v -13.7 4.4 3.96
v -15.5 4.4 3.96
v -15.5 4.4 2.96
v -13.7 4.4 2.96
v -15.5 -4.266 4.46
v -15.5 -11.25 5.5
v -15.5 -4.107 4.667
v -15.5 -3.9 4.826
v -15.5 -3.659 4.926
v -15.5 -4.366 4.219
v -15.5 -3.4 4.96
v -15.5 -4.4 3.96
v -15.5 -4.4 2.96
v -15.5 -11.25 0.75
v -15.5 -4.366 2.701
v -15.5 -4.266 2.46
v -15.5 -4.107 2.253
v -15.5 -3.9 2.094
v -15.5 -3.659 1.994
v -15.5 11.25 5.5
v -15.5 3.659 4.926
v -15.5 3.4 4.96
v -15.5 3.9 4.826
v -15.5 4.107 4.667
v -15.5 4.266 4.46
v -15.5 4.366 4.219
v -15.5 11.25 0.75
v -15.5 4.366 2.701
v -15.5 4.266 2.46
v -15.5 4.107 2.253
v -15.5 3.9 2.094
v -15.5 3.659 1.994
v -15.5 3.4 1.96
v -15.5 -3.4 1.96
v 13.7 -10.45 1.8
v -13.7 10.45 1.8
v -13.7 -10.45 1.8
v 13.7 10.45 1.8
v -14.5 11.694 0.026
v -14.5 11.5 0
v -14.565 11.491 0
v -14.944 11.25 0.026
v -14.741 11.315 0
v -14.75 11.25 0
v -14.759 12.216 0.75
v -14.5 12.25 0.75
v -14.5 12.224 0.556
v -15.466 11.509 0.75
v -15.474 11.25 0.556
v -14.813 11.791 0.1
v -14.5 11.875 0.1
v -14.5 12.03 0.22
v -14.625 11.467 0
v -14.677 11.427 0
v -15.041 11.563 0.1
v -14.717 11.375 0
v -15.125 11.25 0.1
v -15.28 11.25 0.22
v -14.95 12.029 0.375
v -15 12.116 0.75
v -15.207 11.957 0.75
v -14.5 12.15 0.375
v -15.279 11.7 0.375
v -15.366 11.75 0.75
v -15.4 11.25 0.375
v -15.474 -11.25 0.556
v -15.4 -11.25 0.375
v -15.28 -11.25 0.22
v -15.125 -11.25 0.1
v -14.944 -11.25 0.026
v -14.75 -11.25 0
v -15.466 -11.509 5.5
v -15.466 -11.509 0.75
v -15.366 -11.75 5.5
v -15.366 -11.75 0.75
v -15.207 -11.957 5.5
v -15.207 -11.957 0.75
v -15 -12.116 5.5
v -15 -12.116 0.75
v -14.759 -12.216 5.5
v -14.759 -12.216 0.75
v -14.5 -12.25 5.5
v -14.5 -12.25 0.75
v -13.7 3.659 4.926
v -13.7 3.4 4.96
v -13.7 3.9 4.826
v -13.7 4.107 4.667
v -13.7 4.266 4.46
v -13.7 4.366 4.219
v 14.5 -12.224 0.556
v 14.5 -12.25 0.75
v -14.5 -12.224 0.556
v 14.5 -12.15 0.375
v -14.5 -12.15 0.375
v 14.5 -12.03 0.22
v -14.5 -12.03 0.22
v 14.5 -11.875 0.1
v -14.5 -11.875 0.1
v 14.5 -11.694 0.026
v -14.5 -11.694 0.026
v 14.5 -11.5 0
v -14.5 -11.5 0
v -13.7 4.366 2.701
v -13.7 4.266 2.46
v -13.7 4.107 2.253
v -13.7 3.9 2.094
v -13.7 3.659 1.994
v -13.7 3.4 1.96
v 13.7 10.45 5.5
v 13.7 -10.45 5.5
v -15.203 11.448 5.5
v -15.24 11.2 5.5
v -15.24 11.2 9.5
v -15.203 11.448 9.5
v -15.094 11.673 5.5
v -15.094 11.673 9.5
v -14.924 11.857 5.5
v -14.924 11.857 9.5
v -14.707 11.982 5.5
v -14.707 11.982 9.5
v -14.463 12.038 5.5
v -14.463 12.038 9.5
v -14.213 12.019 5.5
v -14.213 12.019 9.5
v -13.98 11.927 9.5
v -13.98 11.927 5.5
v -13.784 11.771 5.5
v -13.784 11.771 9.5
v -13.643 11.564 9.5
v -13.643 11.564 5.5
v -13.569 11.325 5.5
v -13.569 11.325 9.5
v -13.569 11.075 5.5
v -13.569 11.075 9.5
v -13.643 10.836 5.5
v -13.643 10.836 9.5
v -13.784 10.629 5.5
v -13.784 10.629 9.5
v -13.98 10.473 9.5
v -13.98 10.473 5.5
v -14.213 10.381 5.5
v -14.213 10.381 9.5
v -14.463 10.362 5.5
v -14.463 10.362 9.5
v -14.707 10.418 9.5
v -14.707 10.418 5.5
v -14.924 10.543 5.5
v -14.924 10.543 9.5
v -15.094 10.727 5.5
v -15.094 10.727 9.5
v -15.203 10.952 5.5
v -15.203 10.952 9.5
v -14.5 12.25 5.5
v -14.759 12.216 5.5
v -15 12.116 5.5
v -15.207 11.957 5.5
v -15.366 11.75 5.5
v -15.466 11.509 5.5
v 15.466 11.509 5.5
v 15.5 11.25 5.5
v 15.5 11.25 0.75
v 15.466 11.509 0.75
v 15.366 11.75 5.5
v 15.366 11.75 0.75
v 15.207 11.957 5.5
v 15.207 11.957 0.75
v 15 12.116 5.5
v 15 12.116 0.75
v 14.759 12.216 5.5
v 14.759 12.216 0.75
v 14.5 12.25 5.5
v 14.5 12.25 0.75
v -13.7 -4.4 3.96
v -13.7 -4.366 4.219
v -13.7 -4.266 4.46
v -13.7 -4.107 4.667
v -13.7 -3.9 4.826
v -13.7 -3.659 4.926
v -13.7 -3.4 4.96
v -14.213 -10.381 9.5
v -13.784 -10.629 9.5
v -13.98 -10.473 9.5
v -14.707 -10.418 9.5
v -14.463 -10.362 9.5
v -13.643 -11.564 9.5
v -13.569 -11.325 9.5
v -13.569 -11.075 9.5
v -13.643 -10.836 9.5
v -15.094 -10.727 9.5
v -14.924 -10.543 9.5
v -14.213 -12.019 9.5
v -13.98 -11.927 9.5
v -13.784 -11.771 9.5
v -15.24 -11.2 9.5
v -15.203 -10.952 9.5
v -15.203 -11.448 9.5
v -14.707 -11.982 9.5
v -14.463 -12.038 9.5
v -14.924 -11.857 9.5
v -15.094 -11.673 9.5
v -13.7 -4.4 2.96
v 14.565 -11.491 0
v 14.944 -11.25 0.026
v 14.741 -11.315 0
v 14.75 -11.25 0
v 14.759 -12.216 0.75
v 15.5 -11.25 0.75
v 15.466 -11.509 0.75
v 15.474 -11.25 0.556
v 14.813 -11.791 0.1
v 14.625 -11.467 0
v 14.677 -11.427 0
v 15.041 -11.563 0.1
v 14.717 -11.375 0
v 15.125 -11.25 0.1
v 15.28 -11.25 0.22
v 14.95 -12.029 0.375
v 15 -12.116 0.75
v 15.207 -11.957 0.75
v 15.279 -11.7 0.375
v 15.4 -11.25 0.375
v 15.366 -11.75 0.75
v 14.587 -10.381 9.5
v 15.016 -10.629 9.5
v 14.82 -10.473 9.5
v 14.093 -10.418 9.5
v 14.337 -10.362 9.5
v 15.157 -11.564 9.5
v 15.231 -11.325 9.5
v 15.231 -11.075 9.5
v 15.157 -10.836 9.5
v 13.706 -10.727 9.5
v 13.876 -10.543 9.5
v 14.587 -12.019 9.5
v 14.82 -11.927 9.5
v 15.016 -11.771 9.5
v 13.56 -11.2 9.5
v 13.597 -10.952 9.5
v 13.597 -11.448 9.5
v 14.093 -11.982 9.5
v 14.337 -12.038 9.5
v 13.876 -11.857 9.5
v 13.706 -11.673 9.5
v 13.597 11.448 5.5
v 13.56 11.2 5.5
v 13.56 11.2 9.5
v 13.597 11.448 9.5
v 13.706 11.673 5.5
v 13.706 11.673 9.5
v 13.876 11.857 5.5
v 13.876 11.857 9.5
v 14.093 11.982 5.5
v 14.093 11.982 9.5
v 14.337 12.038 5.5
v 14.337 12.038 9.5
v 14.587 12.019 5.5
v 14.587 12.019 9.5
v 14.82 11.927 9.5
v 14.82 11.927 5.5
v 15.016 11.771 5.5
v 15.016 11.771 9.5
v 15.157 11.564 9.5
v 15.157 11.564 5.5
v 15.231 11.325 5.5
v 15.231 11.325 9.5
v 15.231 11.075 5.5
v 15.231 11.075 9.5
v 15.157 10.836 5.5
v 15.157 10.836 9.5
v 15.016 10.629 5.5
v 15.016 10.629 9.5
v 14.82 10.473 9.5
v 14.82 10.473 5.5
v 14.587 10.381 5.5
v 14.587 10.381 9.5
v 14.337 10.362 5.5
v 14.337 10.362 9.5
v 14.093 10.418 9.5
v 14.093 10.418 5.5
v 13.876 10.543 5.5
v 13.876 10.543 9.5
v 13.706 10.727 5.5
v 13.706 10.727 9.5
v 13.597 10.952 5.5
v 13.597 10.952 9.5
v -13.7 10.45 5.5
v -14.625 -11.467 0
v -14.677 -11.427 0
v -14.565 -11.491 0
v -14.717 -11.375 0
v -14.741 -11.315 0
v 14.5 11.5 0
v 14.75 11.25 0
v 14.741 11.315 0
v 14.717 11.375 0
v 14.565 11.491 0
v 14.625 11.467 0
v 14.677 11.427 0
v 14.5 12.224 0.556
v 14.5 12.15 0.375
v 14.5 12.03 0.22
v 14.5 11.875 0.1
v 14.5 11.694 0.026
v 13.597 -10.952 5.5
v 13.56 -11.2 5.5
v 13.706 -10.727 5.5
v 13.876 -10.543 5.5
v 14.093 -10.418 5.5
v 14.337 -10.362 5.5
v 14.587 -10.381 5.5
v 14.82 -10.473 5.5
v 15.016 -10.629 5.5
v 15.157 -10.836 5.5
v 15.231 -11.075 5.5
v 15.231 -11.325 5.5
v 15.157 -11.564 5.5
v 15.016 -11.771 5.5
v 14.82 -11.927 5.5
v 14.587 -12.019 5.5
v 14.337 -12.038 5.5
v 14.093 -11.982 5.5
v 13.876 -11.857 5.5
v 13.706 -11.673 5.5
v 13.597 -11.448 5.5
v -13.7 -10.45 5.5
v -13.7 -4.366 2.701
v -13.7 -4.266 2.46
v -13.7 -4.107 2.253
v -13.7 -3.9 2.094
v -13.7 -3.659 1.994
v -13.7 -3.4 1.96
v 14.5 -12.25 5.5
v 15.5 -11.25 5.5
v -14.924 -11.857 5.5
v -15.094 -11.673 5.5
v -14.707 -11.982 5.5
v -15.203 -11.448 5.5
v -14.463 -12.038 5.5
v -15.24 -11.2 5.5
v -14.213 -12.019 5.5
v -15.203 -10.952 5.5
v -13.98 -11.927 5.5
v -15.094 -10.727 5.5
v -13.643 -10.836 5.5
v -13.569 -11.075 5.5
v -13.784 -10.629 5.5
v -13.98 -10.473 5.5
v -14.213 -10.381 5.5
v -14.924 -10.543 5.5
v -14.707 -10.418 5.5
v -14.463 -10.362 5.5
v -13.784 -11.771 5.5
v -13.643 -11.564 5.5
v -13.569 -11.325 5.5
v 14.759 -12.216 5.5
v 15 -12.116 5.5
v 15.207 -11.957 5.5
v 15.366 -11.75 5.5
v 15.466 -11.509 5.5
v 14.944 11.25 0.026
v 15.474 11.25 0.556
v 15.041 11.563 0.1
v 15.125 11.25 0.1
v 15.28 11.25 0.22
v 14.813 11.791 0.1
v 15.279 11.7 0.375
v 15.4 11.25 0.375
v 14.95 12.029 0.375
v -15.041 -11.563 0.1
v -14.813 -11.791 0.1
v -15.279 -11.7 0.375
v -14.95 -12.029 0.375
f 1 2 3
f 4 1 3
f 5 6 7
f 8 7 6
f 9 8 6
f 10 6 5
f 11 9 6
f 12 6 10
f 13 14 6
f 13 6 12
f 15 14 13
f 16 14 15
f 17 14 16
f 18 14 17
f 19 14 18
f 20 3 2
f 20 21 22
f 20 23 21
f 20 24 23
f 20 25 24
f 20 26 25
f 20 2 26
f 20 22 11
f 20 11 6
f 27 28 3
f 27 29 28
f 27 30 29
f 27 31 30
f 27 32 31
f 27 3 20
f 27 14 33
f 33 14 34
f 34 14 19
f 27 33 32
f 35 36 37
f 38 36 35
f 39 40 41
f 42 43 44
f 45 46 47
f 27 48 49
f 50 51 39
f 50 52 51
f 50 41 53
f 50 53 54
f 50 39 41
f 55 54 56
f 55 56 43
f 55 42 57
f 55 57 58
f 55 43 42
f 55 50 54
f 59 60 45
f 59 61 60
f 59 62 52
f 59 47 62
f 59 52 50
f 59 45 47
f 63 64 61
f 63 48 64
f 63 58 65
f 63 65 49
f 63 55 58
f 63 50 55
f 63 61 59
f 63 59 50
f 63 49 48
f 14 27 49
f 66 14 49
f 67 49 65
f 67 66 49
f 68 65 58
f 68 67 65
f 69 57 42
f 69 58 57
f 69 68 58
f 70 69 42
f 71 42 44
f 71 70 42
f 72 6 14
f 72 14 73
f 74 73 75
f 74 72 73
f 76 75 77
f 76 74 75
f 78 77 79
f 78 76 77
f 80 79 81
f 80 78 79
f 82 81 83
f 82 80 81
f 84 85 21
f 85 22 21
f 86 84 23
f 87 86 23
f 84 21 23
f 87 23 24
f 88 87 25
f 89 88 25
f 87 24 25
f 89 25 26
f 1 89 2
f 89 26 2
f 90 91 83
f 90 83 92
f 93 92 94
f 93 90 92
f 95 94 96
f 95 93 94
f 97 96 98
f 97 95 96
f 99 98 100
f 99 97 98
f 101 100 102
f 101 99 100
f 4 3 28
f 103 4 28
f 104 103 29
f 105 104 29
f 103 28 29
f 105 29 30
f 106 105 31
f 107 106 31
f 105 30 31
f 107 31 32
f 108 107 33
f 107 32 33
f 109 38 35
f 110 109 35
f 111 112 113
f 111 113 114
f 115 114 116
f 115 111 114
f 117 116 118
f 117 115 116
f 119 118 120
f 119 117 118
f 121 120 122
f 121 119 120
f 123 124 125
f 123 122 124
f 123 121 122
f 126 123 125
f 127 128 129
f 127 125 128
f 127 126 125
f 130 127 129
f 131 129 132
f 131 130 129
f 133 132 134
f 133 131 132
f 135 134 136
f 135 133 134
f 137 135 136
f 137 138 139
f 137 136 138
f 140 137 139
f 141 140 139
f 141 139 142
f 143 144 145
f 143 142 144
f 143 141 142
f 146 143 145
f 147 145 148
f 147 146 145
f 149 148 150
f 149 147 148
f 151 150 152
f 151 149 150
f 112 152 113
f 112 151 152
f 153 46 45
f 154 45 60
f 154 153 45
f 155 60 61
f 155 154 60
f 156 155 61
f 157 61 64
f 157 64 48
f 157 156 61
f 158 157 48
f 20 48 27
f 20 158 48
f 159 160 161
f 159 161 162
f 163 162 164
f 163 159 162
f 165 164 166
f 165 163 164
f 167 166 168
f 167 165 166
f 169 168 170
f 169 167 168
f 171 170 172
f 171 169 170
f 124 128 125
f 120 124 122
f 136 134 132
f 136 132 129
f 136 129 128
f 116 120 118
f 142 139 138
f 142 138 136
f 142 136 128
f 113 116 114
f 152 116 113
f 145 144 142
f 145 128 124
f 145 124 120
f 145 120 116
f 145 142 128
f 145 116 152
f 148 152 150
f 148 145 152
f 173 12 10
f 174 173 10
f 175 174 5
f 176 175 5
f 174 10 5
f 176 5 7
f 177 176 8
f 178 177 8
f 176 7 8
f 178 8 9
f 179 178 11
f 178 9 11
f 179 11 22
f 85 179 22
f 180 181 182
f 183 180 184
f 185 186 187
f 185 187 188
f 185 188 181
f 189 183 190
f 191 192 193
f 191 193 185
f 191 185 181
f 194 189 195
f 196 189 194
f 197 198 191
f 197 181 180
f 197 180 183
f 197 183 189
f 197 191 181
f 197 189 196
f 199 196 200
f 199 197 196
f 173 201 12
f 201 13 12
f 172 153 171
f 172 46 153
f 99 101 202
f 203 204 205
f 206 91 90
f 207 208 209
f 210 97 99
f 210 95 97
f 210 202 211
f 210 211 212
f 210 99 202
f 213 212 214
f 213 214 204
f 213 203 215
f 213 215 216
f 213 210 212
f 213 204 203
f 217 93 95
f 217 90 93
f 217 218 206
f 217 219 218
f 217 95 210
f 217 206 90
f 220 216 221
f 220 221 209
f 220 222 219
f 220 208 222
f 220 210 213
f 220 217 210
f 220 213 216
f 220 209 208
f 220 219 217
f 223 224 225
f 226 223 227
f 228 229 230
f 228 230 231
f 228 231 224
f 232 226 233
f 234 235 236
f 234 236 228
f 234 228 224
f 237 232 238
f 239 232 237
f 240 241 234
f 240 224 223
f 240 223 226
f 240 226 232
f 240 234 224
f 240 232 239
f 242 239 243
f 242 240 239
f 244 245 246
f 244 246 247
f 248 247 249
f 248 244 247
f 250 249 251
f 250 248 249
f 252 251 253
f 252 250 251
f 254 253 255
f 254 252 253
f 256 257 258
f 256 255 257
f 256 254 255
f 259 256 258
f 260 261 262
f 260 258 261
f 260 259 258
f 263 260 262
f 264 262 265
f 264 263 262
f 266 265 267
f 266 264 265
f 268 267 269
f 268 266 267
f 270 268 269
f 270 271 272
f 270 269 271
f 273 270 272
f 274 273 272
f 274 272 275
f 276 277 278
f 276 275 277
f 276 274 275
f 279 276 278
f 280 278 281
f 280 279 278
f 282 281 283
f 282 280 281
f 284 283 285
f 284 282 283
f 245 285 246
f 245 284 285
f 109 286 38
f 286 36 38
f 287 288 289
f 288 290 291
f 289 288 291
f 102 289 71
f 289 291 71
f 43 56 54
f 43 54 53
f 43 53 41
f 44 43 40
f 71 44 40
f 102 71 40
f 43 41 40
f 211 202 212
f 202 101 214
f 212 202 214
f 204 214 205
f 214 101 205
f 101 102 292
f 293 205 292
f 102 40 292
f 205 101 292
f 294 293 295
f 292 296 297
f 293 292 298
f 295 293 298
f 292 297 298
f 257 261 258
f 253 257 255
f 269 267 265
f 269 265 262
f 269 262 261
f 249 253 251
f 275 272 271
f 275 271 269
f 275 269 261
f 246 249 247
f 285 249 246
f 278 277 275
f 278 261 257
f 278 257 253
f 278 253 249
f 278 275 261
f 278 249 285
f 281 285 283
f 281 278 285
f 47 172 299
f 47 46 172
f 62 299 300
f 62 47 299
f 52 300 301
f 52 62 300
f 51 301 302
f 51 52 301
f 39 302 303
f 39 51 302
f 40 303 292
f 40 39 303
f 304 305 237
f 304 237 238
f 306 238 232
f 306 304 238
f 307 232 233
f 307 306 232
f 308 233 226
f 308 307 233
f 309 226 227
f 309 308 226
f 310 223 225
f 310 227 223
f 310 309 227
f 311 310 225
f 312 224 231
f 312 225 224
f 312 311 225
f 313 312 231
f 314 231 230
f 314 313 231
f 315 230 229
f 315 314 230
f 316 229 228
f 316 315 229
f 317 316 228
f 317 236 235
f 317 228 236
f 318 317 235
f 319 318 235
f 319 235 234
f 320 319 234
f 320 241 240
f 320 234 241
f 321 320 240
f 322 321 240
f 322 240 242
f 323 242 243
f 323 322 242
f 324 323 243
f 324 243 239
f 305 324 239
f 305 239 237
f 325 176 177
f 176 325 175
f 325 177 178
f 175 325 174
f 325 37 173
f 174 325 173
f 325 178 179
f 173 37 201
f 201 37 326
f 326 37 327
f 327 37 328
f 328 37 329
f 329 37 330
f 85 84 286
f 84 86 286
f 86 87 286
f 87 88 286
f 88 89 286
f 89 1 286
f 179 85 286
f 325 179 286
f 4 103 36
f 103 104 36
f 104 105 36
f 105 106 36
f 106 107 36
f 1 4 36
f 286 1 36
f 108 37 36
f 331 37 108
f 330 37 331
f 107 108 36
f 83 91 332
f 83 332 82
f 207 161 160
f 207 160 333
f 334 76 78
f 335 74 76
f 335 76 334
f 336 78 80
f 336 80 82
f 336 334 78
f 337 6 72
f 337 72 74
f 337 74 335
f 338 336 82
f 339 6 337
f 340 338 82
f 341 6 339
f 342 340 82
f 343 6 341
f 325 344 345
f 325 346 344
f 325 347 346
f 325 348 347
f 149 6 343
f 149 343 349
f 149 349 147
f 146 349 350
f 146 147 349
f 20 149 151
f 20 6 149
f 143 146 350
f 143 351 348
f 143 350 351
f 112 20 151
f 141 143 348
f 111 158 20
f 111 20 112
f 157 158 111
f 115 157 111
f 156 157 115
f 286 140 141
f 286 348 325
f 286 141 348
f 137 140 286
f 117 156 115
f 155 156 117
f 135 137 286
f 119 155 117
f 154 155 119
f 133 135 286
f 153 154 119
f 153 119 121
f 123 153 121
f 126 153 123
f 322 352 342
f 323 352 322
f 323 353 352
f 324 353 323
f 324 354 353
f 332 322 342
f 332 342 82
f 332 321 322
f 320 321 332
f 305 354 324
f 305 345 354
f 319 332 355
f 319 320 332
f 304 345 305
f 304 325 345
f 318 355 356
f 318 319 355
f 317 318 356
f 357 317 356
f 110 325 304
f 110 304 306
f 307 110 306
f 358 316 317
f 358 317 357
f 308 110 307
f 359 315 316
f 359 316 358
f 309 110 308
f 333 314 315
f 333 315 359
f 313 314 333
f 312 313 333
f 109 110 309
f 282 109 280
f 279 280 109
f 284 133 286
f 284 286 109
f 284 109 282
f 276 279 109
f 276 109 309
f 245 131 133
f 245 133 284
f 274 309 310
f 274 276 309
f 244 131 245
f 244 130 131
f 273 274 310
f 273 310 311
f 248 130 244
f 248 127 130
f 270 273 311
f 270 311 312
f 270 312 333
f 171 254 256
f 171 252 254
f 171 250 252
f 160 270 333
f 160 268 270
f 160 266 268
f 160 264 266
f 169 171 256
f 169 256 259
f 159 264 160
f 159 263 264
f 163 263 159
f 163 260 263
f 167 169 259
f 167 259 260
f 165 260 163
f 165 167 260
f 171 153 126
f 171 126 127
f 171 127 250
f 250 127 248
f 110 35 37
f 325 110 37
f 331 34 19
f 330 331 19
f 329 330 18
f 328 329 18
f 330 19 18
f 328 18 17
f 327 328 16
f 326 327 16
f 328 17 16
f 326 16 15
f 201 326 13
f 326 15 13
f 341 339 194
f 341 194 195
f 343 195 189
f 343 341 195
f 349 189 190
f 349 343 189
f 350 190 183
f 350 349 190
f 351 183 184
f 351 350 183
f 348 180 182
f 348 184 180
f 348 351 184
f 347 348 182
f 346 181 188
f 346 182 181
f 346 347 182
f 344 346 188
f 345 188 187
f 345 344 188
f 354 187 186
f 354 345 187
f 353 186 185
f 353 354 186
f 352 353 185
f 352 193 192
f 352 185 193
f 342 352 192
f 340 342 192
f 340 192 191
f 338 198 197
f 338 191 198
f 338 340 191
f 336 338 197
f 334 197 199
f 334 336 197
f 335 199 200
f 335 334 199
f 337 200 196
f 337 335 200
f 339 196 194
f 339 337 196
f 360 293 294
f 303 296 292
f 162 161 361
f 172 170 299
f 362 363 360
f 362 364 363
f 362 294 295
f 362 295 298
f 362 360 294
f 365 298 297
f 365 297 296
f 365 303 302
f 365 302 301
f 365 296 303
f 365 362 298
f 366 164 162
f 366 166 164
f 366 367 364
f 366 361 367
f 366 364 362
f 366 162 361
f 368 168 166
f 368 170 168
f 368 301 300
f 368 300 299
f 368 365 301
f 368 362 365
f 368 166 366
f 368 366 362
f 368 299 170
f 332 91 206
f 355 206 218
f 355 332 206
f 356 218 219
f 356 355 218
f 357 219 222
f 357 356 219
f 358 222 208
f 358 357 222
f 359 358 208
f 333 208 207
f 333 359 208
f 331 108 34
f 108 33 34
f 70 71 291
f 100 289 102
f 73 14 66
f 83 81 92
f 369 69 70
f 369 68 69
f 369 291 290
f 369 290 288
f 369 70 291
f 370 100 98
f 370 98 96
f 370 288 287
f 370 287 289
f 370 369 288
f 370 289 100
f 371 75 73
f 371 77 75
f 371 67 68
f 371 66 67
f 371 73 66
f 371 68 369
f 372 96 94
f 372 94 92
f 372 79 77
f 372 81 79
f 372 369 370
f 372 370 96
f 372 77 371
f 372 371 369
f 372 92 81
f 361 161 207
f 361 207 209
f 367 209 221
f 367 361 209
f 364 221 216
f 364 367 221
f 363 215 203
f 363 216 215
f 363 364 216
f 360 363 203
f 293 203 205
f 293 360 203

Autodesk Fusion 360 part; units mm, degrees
sketch "Sketch1" plane through (0, 0, 0) normal (0, 0, 1) x (1, 0, 0)
  line L0 (-15.5, 12.25) -> (15.5, 12.25)
  line L1 (15.5, 12.25) -> (15.5, -12.25)
  line L2 (15.5, -12.25) -> (-15.5, -12.25)
  line L3 (-15.5, -12.25) -> (-15.5, 12.25)
  line L4 (-15.5, 12.25) -> (15.5, -12.25) construction
  line L5 (15.5, 12.25) -> (-15.5, -12.25) construction
  dimension "d1" = 31
  dimension "d2" = 24.5
extrude "Extrude1" add sketch "Sketch1" along normal blind 5.5
shell "Shell1" thickness 1.8 removed faces 1 at (-5.1667, 4.0833, 5.5)
sketch "Sketch2" plane through (0, 0, 5.5) normal (0, 0, 1) x (-1, 0, 0)
  line L0 (13.7, 10.45) -> (13.7, -10.45)
  line L1 (13.7, -10.45) -> (-13.7, -10.45)
  line L2 (-13.7, -10.45) -> (-13.7, 10.45)
  line L3 (-13.7, 10.45) -> (13.7, 10.45)
  line L4 (15.5, 12.25) -> (-15.5, 12.25)
  line L5 (-15.5, 12.25) -> (-15.5, -12.25)
  line L6 (-15.5, -12.25) -> (15.5, -12.25)
  line L7 (15.5, -12.25) -> (15.5, 12.25)
  circle A0 centre (14.4, -11.2) radius 0.84
  line L8 (0, 0) -> (0, -2)
  line L9 (0, 0) -> (4, 0)
  circle A1 centre (-14.4, -11.2) radius 0.84
  circle A2 centre (-14.4, 11.2) radius 0.84
  circle A3 centre (14.4, 11.2) radius 0.84
  dimension "d6" = 1.68
  dimension "d7" = 11.2
  dimension "d8" = 14.4
extrude "Extrude2" add sketch "Sketch2" along normal blind 4 contours A0 | A1 | A2 | A3
fillet "Fillet1" radius 1 1 edges at (15.5, -12.25, 2.75)
fillet "Fillet1" radius 1 1 edges at (15.5, 12.25, 2.75)
fillet "Fillet1" radius 1 1 edges at (-15.5, 12.25, 2.75)
fillet "Fillet1" radius 1 1 edges at (-15.5, -12.25, 2.75)
sketch "Sketch3" plane through (-15.5, 0, 0) normal (-1, 0, 0) x (0, -1, 0)
  line L0 (11.25, 0) -> (11.25, 5.5)
  line L1 (11.25, 5.5) -> (-11.25, 5.5)
  line L2 (-11.25, 5.5) -> (-11.25, 0)
  line L3 (-11.25, 0) -> (11.25, 0)
  line L4 (0, 0) -> (0, 1.96)
  line L5 (0, 1.96) -> (0, 3.46)
  line L6 (-3.4, 1.96) -> (3.4, 1.96)
  line L7 (4.4, 2.96) -> (4.4, 3.96)
  line L8 (3.4, 4.96) -> (-3.4, 4.96)
  line L9 (-4.4, 3.96) -> (-4.4, 2.96)
  line L10 (-4.4, 1.96) -> (4.4, 4.96) construction
  line L11 (4.4, 1.96) -> (-4.4, 4.96) construction
  arc A0 (-3.4, 4.96) -> (-4.4, 3.96) centre (-3.4, 3.96) ccw
  arc A1 (-4.4, 2.96) -> (-3.4, 1.96) centre (-3.4, 2.96) ccw
  arc A2 (3.4, 1.96) -> (4.4, 2.96) centre (3.4, 2.96) ccw
  arc A3 (4.4, 3.96) -> (3.4, 4.96) centre (3.4, 3.96) ccw
  point P0 (0, 3.46)
  dimension "d19" = 1.96
  dimension "d20" = 1.5
  dimension "d21" = 3
  dimension "d22" = 8.8
  dimension "d23" = 1
extrude "Extrude3" cut sketch "Sketch3" against normal blind 6 contours L6 L7 L8 L9 A0 A1 A2 A3
fillet "Fillet2" radius 0.75 8 edges at (-15.2071, -11.9571, 0) (-15.5, 0, 0) (-15.2071, 11.9571, 0) (0, 12.25, 0) (15.2071, 11.9571, 0) (15.5, 0, 0) (15.2071, -11.9571, 0) (0, -12.25, 0)
